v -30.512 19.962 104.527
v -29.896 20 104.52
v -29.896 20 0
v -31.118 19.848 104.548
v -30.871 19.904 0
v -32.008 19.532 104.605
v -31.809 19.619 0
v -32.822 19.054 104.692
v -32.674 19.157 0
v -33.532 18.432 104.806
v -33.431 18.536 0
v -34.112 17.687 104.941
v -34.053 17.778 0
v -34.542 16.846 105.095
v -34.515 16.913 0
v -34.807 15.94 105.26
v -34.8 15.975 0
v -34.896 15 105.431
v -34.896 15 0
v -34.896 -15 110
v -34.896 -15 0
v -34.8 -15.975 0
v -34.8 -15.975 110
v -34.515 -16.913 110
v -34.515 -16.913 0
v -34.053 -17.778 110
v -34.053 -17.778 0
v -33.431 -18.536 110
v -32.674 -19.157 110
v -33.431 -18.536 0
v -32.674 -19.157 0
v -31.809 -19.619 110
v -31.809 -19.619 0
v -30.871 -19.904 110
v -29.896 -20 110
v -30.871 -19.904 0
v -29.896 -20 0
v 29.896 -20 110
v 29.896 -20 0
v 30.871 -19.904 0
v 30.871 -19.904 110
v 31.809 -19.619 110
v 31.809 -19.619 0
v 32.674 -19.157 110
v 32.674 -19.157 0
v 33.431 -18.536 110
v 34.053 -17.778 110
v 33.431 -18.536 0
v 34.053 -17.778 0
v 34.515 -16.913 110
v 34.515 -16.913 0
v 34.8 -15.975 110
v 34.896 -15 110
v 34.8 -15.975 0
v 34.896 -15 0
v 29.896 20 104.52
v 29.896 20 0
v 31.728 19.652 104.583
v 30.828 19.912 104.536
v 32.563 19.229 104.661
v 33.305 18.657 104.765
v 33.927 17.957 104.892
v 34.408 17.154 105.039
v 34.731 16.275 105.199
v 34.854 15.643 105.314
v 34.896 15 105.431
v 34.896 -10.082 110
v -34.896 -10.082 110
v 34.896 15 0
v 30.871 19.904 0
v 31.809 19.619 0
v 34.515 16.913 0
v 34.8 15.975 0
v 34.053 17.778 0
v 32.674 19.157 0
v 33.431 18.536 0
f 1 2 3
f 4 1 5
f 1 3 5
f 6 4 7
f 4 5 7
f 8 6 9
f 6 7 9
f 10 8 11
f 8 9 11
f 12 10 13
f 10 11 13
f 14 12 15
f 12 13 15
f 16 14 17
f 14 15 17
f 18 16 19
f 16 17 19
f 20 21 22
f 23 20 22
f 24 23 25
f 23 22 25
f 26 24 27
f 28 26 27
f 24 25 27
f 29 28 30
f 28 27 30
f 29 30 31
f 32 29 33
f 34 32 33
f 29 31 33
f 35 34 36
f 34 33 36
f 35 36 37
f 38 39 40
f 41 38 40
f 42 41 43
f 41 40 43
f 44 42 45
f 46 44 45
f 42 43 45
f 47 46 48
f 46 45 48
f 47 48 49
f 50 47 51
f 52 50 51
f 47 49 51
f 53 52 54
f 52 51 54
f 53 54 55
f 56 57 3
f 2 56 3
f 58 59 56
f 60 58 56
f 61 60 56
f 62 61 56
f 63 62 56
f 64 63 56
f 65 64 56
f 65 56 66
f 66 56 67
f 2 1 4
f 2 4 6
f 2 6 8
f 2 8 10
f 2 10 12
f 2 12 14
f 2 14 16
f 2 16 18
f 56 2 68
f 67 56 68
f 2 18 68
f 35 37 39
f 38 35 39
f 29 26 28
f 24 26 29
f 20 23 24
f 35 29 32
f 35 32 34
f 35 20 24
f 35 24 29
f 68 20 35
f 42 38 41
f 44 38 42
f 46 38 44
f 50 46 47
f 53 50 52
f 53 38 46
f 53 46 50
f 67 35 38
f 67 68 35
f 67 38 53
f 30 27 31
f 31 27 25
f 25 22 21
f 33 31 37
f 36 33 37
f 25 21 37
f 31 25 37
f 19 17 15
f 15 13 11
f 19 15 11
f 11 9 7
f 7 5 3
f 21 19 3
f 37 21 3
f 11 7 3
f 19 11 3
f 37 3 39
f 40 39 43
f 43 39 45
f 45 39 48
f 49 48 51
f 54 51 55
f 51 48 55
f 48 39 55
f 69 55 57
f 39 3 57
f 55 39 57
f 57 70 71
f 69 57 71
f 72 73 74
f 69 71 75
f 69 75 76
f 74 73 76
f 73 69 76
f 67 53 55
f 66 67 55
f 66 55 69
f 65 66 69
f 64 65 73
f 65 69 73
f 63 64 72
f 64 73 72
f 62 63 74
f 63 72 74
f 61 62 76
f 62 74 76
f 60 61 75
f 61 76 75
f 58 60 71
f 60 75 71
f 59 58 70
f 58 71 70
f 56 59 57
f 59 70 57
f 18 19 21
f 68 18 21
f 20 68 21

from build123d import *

# Parameters (mm, degrees)
F1_DEPTH = 110
F3_DEPTH = 69.792666


with BuildPart() as f1:
    # F0 (on Top) → F1 (new body)
    with BuildSketch(Plane.XY):
        with BuildLine():
            ThreePointArc((-34.895833, -15), (-33.431367, -18.535534), (-29.895833, -20))
            Line((-29.895833, -20), (29.895833, -20))
            ThreePointArc((29.895833, -20), (33.431367, -18.535534), (34.895833, -15))
            Line((34.895833, -15), (34.895833, 15))
            ThreePointArc((34.895833, 15), (33.431367, 18.535534), (29.895833, 20))
            Line((29.895833, 20), (-29.895833, 20))
            ThreePointArc((-29.895833, 20), (-33.431367, 18.535534), (-34.895833, 15))
            Line((-34.895833, 15), (-34.895833, -15))
        make_face()
    extrude(amount=F1_DEPTH)

    # F2 (on face) → F3 (cut, through all)
    with BuildSketch(Plane(origin=(-34.895833, 0, 0), x_dir=(0, -1, 0), z_dir=(-1, 0, 0))):
        Polygon((-20.880114, 110), (-20.880114, 104.359761), (10.082219, 110), align=None)
    extrude(amount=-F3_DEPTH, mode=Mode.SUBTRACT)


solid = f1.part
